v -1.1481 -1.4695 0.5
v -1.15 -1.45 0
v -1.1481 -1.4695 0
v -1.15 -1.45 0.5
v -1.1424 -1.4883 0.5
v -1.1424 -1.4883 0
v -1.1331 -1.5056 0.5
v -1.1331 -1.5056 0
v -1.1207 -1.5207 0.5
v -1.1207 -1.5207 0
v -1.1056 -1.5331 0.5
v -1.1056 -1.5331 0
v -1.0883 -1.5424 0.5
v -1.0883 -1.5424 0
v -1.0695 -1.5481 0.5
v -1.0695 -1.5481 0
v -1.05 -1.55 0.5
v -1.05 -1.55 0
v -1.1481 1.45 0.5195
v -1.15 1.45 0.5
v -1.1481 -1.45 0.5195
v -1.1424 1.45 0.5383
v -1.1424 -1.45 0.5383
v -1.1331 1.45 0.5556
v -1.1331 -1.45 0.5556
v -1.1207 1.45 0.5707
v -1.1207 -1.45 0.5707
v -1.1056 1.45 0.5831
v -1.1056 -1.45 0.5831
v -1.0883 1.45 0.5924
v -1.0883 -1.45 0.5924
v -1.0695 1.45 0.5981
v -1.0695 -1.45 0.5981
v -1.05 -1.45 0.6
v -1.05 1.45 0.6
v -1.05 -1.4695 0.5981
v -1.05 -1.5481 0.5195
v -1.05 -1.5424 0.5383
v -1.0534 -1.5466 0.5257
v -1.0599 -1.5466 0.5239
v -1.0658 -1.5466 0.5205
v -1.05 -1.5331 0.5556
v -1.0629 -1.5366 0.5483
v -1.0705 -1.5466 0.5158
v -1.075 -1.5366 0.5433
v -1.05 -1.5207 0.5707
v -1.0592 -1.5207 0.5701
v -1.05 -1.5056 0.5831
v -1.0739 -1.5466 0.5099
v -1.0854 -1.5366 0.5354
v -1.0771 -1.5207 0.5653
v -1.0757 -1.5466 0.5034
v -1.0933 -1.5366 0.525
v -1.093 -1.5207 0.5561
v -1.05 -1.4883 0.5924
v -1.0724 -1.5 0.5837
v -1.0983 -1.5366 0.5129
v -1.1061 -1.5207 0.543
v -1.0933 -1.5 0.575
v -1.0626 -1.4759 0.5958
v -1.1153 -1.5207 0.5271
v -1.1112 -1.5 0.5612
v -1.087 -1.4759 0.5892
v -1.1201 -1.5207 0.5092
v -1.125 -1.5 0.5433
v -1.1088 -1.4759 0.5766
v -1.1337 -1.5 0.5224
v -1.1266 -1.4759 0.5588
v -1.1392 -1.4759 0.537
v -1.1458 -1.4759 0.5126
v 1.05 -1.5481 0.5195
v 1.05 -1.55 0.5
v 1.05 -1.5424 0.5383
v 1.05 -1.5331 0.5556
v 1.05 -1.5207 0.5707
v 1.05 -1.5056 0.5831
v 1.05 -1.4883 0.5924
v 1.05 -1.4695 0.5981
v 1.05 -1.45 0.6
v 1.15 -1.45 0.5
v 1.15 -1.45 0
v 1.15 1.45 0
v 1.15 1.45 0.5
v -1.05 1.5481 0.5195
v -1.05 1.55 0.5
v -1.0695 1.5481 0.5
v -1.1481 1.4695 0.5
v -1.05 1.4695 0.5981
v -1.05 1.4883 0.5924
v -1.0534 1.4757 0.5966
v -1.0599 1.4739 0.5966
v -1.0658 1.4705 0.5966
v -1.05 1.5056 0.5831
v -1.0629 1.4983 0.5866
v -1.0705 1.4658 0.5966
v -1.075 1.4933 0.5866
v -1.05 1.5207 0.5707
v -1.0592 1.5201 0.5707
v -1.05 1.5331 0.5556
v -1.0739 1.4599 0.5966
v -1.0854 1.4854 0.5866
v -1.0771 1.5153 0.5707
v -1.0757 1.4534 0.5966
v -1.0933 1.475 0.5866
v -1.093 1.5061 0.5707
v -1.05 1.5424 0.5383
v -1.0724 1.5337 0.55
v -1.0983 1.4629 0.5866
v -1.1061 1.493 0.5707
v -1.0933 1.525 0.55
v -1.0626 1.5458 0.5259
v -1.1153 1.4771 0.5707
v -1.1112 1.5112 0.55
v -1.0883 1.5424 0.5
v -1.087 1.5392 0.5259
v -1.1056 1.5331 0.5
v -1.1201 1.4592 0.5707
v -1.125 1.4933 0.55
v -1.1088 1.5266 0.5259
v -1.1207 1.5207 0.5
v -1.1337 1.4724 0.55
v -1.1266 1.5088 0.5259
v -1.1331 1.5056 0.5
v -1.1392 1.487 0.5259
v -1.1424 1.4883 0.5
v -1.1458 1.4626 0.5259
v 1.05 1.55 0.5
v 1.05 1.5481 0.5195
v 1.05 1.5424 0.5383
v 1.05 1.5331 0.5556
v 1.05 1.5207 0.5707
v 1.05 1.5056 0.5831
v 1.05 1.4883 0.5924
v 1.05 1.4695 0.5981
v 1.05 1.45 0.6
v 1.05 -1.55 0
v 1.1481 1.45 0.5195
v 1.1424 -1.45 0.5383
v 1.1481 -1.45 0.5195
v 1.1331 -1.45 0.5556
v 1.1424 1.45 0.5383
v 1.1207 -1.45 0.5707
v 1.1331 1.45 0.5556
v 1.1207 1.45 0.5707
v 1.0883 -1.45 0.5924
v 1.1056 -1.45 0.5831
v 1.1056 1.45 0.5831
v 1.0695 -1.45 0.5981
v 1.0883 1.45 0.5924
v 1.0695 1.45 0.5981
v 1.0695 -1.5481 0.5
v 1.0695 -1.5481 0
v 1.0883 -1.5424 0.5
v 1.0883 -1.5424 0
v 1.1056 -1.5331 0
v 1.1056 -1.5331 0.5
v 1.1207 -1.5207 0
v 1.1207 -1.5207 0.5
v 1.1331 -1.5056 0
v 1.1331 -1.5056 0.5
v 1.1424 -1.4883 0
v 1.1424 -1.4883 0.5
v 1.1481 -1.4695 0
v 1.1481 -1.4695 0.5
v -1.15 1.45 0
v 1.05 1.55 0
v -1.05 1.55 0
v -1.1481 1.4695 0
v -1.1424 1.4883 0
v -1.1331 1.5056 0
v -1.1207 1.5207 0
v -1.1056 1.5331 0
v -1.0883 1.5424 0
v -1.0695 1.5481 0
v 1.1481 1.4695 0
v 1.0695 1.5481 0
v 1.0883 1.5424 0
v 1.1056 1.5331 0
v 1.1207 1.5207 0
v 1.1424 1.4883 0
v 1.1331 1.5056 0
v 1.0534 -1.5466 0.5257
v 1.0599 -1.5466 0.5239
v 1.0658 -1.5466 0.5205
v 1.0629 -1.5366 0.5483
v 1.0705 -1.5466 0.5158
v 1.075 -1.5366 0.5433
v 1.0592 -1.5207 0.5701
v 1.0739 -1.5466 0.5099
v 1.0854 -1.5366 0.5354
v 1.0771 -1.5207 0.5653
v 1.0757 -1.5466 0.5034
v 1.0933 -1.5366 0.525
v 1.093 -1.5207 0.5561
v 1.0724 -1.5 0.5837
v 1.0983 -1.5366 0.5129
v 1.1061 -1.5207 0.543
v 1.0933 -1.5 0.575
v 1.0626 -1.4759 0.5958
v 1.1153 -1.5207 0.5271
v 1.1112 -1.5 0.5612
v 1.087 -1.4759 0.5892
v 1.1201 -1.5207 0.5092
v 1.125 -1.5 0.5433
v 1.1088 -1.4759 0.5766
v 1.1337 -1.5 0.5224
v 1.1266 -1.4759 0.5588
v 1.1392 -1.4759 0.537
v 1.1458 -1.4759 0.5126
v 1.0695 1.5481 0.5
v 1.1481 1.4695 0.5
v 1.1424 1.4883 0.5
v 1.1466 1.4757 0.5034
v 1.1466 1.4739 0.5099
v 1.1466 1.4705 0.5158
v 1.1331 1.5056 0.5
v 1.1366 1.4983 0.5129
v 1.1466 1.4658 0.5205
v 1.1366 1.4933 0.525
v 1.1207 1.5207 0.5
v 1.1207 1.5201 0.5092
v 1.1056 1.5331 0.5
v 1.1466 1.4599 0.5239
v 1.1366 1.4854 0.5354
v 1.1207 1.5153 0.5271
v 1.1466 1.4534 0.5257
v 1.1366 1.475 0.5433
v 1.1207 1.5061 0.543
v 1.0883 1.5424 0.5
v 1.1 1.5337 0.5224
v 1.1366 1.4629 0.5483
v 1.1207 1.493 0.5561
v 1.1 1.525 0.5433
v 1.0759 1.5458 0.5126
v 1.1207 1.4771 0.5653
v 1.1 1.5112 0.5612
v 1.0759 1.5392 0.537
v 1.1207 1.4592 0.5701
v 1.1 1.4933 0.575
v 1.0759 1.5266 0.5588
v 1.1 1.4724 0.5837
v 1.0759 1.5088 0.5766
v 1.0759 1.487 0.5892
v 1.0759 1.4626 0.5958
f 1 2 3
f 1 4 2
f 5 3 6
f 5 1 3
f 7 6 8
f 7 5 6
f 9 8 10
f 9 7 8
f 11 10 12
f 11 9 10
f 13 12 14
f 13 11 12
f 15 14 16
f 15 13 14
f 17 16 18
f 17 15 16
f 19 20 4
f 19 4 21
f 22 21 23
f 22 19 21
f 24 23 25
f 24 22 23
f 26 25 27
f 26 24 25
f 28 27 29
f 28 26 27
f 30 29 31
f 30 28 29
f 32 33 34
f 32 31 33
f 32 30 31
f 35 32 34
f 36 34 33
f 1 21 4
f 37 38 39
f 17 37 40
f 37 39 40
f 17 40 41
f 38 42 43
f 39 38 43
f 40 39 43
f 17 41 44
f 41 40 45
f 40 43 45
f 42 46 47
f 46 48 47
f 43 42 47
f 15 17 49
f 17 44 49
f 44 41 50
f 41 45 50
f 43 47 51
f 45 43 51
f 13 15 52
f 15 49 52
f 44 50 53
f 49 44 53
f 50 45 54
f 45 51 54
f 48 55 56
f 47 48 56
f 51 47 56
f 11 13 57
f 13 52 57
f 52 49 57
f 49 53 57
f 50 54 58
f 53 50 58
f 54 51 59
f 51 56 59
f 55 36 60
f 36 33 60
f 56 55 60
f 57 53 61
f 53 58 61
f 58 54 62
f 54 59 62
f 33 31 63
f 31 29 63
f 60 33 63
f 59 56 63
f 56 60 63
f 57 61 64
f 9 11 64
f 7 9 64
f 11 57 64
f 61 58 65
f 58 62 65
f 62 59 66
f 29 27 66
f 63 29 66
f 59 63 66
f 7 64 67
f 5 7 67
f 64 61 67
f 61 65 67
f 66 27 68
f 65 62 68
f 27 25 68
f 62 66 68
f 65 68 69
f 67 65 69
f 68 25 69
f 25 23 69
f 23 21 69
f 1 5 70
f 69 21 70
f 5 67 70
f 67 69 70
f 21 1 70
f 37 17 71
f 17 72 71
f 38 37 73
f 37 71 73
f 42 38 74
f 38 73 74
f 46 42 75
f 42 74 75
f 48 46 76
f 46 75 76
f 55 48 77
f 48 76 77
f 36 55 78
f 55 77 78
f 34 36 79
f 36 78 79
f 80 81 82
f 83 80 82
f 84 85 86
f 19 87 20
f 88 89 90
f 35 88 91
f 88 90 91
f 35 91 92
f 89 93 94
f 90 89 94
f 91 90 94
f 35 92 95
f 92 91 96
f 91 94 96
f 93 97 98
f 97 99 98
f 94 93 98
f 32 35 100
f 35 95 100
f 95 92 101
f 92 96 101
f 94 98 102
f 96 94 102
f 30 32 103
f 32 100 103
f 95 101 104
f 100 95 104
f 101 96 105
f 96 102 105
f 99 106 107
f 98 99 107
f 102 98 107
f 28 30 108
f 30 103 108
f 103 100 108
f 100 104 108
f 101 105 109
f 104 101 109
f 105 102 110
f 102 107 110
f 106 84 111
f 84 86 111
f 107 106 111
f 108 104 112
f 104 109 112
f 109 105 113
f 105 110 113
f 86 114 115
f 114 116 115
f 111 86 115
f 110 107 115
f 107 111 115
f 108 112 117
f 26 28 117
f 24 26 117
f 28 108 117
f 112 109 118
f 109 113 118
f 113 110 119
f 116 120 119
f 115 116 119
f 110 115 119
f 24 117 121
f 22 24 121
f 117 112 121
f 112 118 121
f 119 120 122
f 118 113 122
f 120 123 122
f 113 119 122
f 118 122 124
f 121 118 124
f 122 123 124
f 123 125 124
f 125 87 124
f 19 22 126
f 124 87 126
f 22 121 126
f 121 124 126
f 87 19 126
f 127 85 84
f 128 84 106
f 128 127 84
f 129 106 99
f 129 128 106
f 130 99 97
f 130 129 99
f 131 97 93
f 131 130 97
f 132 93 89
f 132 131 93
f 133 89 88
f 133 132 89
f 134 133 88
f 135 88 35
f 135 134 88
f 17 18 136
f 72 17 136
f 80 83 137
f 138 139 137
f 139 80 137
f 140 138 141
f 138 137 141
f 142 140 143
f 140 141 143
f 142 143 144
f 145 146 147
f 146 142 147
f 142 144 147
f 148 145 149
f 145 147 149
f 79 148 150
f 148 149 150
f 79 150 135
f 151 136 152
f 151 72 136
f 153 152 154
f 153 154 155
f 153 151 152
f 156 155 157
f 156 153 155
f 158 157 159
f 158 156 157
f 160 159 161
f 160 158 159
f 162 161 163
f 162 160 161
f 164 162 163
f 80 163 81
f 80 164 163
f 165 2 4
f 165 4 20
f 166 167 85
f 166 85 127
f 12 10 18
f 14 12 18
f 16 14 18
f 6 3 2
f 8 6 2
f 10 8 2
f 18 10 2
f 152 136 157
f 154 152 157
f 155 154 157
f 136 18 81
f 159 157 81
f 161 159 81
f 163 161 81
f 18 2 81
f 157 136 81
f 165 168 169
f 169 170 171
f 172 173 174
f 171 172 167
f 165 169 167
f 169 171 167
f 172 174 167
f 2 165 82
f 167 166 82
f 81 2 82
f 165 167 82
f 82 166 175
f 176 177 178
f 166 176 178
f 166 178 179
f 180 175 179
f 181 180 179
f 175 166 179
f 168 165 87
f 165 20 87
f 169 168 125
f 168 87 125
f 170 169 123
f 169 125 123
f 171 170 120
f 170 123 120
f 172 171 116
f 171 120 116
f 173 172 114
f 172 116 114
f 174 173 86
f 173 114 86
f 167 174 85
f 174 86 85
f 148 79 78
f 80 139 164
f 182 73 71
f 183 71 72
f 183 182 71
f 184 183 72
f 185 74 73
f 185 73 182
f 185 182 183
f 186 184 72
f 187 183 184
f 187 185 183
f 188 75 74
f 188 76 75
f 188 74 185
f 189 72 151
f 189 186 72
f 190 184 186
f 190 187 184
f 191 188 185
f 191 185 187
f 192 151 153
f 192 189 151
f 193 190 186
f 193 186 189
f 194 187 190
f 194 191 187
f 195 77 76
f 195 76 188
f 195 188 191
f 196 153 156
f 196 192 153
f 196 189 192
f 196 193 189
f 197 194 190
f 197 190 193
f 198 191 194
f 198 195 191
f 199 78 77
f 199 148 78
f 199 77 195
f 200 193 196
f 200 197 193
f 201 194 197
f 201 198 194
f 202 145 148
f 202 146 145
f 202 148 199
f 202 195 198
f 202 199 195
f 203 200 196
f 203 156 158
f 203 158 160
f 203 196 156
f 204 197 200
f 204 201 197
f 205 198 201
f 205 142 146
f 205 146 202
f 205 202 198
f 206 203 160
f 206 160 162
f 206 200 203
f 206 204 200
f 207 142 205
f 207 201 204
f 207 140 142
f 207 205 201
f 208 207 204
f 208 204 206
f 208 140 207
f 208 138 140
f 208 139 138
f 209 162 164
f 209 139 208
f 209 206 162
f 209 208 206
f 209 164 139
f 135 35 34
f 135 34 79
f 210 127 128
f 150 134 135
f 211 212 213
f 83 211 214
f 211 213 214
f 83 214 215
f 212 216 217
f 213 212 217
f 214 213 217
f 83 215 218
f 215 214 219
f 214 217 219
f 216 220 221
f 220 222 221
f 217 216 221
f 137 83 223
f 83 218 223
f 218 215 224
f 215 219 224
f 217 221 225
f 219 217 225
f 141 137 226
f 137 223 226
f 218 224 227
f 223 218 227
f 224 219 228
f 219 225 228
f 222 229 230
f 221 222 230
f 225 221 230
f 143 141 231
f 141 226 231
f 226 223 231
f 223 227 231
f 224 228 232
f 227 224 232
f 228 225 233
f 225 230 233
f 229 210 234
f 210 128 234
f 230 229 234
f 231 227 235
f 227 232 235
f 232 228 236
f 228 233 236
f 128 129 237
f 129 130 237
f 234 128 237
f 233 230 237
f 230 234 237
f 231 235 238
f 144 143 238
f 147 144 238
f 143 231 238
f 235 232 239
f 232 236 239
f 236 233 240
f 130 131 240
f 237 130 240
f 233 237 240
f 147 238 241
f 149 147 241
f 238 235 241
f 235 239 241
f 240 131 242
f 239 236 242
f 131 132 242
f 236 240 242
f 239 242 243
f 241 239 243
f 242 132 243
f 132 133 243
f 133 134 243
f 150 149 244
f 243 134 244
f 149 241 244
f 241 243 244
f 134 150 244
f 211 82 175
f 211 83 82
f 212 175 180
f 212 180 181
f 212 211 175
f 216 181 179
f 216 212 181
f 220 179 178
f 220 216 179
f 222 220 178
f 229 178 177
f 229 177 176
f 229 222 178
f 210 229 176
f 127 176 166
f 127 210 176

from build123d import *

# Parameters (mm, degrees)
SKETCH_W  = 2.3
SKETCH_H  = 3.1
PAD_DEPTH = 0.6
FILLET_R  = 0.1


with BuildPart() as part:
    # Sketch → Pad (new body)
    with BuildSketch(Plane.XY):
        Rectangle(SKETCH_W, SKETCH_H)
    extrude(amount=PAD_DEPTH)

    # Fillet
    fillet_edges = [part.edges().sort_by_distance(p)[0] for p in [
        (-1.15, 1.55, 0.3),
        (0, 1.55, 0.6),
        (-1.15, 0, 0.6),
        (1.15, 1.55, 0.3),
        (1.15, 0, 0.6),
        (0, -1.55, 0.6),
        (1.15, -1.55, 0.3),
        (-1.15, -1.55, 0.3),
    ]]
    fillet(fillet_edges, radius=FILLET_R)


solid = part.part
